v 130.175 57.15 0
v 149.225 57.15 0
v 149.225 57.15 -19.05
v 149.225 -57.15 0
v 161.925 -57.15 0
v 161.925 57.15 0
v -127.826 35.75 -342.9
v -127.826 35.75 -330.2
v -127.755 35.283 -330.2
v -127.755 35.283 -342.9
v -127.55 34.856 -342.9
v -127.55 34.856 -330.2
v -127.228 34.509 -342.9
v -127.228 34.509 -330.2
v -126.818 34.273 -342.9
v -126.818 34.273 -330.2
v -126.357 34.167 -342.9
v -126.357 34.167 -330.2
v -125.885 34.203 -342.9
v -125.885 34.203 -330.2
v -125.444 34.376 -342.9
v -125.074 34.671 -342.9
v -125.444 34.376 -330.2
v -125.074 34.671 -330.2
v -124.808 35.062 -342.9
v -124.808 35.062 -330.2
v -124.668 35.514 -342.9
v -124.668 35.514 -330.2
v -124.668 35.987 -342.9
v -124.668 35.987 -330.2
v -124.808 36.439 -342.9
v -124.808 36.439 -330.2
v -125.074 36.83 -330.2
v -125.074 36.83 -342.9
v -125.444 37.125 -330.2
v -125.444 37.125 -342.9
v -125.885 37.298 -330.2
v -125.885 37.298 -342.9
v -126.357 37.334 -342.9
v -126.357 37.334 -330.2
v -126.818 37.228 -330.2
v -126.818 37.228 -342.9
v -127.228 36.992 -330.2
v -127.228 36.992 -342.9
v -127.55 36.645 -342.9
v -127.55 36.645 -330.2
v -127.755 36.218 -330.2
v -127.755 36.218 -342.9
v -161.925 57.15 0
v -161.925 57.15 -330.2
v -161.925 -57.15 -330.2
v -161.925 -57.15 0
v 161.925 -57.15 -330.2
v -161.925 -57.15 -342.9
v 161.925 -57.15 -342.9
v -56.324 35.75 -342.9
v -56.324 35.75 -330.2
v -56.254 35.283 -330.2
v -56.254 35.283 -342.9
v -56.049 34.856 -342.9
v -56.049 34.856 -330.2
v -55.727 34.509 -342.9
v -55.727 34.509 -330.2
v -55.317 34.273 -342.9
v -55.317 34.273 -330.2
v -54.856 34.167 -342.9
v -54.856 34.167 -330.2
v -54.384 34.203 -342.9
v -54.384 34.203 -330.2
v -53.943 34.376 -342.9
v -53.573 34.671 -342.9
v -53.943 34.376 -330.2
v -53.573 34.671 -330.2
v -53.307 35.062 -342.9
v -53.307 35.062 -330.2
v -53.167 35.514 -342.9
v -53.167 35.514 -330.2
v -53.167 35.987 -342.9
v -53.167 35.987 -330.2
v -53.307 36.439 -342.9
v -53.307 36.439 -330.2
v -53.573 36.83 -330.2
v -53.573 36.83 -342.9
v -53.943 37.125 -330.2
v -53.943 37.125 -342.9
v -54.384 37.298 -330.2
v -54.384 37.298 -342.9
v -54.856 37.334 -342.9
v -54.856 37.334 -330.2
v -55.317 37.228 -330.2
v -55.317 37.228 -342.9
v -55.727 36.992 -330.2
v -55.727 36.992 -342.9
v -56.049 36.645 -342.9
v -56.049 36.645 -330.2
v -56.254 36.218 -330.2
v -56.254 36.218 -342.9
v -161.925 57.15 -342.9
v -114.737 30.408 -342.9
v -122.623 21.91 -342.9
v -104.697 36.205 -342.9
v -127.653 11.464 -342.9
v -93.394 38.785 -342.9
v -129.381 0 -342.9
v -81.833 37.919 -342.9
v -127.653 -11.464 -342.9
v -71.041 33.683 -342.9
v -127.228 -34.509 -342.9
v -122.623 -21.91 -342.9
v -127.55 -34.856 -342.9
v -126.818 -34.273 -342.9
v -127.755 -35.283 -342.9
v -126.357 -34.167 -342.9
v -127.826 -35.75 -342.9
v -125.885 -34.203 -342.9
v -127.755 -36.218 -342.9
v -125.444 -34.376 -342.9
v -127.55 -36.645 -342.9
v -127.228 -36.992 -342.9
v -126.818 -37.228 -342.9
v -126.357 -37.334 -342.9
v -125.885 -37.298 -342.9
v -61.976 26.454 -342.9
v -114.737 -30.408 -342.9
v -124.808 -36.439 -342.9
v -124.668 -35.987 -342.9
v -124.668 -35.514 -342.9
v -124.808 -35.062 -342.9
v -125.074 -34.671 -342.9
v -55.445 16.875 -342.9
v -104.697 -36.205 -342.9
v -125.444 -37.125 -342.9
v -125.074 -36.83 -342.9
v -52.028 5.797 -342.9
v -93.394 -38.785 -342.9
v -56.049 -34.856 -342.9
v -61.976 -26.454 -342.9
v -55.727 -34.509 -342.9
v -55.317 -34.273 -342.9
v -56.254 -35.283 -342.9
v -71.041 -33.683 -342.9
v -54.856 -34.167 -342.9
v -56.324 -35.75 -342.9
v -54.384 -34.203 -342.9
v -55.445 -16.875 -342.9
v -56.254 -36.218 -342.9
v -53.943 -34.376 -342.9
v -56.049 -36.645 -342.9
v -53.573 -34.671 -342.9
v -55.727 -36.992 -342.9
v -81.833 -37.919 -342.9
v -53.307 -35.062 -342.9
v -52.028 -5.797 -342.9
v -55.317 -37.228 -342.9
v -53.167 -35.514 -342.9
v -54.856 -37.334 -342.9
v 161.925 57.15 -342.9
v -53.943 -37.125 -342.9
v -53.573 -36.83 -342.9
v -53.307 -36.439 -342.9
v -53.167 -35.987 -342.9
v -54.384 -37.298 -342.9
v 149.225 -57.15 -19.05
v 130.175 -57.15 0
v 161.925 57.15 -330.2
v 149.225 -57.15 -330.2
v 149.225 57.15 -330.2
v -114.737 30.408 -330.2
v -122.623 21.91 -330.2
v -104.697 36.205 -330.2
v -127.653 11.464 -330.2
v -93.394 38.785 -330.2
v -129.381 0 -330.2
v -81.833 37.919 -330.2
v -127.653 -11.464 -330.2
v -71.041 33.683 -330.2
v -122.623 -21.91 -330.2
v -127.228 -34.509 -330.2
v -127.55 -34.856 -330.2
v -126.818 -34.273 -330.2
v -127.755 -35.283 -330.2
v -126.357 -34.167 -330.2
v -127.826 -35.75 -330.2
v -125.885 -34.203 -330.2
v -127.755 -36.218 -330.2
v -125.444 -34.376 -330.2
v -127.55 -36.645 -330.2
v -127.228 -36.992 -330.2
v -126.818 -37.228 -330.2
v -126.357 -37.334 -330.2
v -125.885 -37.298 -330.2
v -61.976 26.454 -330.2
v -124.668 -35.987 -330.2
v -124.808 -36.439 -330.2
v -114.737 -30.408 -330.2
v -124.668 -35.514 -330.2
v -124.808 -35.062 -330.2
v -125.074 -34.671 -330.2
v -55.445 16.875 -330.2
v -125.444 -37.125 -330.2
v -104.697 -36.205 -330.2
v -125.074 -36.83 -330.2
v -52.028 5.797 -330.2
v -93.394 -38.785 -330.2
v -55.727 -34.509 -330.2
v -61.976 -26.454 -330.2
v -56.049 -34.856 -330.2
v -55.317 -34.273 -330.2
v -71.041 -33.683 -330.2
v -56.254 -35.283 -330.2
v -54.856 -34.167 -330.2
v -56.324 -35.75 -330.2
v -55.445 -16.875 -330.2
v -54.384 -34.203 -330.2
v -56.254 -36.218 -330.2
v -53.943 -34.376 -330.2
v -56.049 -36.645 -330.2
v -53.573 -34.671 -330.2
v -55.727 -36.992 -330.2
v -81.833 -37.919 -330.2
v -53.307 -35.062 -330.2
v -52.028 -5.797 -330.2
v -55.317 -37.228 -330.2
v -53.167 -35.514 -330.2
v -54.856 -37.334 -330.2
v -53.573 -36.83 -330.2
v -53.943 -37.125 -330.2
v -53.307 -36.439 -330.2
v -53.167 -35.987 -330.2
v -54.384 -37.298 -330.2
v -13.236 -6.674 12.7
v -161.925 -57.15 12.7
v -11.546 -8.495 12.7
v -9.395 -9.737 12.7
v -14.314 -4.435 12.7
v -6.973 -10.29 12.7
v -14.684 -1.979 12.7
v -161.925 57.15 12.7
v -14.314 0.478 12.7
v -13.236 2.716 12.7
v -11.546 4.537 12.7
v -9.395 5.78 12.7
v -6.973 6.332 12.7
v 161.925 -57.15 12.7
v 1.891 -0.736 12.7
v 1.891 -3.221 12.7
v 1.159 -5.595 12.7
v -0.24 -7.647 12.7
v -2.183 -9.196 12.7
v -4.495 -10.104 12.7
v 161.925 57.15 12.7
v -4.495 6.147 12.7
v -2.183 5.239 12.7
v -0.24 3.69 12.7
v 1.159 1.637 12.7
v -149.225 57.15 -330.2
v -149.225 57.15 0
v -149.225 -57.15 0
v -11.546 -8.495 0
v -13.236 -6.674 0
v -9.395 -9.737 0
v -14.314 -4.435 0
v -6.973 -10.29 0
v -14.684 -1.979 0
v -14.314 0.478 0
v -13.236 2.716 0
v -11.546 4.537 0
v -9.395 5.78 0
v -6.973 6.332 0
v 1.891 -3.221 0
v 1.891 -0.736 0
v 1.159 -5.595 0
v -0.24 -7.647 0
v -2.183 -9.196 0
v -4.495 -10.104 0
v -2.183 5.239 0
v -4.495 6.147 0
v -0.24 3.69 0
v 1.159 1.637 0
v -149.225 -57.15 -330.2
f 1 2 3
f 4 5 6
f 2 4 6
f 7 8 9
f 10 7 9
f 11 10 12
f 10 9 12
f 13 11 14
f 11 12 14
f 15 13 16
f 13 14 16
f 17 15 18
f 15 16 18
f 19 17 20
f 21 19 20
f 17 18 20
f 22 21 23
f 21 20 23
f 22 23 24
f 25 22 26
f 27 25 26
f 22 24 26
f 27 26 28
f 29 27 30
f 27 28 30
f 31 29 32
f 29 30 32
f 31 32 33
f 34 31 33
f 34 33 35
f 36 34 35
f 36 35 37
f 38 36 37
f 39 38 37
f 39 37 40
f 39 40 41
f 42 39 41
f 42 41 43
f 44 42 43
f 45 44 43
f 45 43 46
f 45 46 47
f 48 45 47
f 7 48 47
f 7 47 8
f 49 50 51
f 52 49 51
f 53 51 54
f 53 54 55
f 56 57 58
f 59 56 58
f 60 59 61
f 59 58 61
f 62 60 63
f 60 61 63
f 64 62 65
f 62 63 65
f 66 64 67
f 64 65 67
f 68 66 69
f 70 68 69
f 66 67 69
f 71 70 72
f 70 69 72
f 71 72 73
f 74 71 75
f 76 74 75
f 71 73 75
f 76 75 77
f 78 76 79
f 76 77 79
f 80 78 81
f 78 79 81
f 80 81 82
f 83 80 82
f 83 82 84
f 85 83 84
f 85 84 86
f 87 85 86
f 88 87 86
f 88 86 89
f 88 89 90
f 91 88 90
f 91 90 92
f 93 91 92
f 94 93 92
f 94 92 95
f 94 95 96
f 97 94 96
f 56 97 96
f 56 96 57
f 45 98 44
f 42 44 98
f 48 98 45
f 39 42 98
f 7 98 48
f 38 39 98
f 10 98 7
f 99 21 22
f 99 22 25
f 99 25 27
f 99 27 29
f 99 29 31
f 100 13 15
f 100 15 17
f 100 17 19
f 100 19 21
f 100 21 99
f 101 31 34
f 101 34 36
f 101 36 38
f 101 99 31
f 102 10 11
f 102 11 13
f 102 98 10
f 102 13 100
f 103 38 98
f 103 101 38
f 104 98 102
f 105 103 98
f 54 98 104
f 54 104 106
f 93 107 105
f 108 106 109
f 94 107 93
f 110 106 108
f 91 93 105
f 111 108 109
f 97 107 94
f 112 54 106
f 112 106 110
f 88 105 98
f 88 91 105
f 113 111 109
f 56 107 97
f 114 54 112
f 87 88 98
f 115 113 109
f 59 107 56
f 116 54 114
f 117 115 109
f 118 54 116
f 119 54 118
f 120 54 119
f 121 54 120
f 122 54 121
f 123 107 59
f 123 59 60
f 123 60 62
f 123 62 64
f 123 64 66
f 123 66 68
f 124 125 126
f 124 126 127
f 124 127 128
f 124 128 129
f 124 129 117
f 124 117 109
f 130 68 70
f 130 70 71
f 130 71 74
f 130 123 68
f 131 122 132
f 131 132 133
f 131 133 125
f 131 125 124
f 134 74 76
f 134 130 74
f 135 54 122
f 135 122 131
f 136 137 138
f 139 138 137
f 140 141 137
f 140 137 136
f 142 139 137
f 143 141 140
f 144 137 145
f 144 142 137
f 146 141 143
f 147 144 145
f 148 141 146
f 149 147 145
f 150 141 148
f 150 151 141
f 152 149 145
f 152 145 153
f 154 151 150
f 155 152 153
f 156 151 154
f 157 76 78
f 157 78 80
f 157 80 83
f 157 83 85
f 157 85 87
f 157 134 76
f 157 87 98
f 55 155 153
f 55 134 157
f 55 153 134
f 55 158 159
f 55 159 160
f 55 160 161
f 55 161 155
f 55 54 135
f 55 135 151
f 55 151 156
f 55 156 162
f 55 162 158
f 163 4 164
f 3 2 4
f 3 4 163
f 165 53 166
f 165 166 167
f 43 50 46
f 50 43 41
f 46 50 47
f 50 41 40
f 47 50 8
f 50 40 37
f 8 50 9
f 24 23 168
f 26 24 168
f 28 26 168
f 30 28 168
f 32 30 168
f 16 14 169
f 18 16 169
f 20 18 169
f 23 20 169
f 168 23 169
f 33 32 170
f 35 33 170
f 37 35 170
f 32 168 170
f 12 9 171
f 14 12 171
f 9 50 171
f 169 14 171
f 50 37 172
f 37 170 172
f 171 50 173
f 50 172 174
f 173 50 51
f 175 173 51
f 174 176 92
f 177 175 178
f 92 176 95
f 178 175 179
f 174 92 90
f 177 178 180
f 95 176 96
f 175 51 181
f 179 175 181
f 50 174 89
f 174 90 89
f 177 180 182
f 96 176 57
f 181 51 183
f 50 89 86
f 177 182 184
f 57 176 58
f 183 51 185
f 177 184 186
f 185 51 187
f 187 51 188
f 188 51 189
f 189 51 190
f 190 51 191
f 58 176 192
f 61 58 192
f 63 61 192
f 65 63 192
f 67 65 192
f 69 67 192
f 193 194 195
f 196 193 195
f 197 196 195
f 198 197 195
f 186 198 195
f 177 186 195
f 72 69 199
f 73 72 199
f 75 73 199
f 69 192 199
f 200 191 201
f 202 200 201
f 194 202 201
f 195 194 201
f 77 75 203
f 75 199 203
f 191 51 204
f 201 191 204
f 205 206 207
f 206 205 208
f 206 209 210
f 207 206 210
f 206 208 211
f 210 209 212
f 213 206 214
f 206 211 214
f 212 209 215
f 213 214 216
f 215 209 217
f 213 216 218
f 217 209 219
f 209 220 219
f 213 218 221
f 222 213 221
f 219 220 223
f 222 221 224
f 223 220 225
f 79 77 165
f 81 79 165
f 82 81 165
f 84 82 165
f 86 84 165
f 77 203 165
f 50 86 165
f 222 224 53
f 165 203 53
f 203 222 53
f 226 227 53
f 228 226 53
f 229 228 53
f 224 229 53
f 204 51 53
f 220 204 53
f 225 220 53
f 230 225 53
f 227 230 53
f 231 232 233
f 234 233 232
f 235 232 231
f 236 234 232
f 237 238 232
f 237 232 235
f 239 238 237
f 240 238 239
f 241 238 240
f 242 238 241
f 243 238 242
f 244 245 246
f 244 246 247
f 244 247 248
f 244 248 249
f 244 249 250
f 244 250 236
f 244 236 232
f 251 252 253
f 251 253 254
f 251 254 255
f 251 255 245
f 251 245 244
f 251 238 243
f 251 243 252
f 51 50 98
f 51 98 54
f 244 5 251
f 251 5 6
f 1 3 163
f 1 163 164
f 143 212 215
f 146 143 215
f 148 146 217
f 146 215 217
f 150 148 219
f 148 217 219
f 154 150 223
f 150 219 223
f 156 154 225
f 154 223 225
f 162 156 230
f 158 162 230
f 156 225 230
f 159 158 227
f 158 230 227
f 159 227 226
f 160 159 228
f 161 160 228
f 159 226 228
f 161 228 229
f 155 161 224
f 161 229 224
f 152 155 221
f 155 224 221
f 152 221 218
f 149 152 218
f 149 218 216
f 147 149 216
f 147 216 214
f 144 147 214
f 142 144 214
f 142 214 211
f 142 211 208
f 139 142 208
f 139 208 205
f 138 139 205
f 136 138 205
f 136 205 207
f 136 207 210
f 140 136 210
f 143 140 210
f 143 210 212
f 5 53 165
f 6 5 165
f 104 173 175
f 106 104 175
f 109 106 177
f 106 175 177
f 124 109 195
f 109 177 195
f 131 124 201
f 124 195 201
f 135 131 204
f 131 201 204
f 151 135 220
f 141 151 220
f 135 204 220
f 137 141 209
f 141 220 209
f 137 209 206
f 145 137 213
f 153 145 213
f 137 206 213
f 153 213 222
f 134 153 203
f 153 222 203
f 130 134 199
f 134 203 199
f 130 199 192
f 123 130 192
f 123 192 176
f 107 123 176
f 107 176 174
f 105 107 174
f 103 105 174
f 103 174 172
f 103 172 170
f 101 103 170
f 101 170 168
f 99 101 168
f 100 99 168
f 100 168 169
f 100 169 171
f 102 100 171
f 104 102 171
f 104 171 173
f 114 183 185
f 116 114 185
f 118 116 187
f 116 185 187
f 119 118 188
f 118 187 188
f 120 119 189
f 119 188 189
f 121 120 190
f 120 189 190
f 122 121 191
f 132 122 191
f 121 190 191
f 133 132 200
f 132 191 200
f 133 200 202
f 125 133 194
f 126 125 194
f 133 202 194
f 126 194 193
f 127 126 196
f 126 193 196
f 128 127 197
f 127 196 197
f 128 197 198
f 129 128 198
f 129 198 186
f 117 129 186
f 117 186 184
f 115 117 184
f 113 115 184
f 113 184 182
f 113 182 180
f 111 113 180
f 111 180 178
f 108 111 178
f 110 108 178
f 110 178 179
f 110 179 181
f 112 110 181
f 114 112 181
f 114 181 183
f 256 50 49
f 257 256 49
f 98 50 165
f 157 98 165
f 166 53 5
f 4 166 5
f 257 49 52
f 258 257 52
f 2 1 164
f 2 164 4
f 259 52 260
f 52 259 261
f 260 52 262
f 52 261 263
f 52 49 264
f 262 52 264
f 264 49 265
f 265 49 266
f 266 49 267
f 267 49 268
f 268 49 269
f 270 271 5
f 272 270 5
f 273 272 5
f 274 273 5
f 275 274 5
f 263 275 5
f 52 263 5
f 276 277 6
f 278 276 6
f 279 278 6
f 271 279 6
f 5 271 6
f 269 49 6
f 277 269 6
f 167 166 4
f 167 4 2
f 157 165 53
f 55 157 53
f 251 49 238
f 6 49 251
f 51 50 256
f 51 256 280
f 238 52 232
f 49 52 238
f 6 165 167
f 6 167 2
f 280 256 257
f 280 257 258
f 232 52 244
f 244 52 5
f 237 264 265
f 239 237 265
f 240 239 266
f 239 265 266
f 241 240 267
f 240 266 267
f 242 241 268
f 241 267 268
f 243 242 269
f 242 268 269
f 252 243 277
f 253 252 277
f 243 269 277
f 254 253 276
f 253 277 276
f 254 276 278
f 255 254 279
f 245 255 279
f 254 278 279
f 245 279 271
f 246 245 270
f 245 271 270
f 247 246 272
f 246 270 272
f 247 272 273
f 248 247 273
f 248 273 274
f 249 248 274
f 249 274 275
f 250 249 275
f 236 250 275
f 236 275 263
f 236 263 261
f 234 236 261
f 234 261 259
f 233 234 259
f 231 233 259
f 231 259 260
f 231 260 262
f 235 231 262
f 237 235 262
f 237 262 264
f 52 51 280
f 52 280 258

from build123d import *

# Parameters (mm, degrees)
F0_W     = 323.85
F0_H     = 114.3
F1_DEPTH = 12.7
F2_W     = 114.3
F2_H     = 330.2
F3_DEPTH = 12.7
F4_W     = 114.3
F4_H     = 330.2
F5_DEPTH = 12.7
F7_DEPTH = 114.3
F8_W     = 323.85
F8_H     = 114.3
F9_DEPTH = 12.7
F11_D    = 16.66875
F13_D    = 77.7875
F15_D    = 3.175


with BuildPart() as f1:
    # F0 (on Top) → F1 (new body)
    with BuildSketch(Plane.XY):
        Rectangle(F0_W, F0_H)
    extrude(amount=F1_DEPTH)

    # F11 (through all)
    with Locations(Plane.XY.offset(12.7)):
        with Locations((-6.35, -1.97866)):
            Hole(F11_D / 2)


with BuildPart() as f3:
    # F2 (on face) → F3 (new body)
    with BuildSketch(Plane.YZ.offset(161.925)):
        with Locations((0, -165.1)):
            Rectangle(F2_W, F2_H)
    extrude(amount=-F3_DEPTH)


with BuildPart() as f5:
    # F4 (on face) → F5 (new body)
    with BuildSketch(Plane(origin=(-161.925, 0, 0), x_dir=(0, -1, 0), z_dir=(-1, 0, 0))):
        with Locations((0, -165.1)):
            Rectangle(F4_W, F4_H)
    extrude(amount=-F5_DEPTH)


with BuildPart() as f7:
    # F6 (on face) → F7 (new body, through all)
    with BuildSketch(Plane(origin=(0, 57.15, 0), x_dir=(-1, 0, 0), z_dir=(0, 1, 0))):
        Polygon((-130.175, 0), (-149.225, 0), (-149.225, -19.05), align=None)
    extrude(amount=-F7_DEPTH)


with BuildPart() as f9:
    # F8 (on face) → F9 (new body)
    with BuildSketch(Plane(origin=(0, 0, -330.2), x_dir=(1, 0, 0), z_dir=(0, 0, -1))):
        Rectangle(F8_W, F8_H)
    extrude(amount=F9_DEPTH)

    # F13 (through all)
    with Locations(Plane(origin=(0, 0, -342.9), x_dir=(1, 0, 0), z_dir=(0, 0, -1))):
        with Locations((-90.4875, 0)):
            Hole(F13_D / 2)

    # F15 (through all)
    with Locations(Plane(origin=(0, 0, -342.9), x_dir=(1, 0, 0), z_dir=(0, 0, -1))):
        with Locations((-54.737, 35.7505), (-126.238, 35.7505), (-126.238, -35.7505), (-54.737, -35.7505)):
            Hole(F15_D / 2)


solid = Compound([f1.part, f3.part, f5.part, f7.part, f9.part])
